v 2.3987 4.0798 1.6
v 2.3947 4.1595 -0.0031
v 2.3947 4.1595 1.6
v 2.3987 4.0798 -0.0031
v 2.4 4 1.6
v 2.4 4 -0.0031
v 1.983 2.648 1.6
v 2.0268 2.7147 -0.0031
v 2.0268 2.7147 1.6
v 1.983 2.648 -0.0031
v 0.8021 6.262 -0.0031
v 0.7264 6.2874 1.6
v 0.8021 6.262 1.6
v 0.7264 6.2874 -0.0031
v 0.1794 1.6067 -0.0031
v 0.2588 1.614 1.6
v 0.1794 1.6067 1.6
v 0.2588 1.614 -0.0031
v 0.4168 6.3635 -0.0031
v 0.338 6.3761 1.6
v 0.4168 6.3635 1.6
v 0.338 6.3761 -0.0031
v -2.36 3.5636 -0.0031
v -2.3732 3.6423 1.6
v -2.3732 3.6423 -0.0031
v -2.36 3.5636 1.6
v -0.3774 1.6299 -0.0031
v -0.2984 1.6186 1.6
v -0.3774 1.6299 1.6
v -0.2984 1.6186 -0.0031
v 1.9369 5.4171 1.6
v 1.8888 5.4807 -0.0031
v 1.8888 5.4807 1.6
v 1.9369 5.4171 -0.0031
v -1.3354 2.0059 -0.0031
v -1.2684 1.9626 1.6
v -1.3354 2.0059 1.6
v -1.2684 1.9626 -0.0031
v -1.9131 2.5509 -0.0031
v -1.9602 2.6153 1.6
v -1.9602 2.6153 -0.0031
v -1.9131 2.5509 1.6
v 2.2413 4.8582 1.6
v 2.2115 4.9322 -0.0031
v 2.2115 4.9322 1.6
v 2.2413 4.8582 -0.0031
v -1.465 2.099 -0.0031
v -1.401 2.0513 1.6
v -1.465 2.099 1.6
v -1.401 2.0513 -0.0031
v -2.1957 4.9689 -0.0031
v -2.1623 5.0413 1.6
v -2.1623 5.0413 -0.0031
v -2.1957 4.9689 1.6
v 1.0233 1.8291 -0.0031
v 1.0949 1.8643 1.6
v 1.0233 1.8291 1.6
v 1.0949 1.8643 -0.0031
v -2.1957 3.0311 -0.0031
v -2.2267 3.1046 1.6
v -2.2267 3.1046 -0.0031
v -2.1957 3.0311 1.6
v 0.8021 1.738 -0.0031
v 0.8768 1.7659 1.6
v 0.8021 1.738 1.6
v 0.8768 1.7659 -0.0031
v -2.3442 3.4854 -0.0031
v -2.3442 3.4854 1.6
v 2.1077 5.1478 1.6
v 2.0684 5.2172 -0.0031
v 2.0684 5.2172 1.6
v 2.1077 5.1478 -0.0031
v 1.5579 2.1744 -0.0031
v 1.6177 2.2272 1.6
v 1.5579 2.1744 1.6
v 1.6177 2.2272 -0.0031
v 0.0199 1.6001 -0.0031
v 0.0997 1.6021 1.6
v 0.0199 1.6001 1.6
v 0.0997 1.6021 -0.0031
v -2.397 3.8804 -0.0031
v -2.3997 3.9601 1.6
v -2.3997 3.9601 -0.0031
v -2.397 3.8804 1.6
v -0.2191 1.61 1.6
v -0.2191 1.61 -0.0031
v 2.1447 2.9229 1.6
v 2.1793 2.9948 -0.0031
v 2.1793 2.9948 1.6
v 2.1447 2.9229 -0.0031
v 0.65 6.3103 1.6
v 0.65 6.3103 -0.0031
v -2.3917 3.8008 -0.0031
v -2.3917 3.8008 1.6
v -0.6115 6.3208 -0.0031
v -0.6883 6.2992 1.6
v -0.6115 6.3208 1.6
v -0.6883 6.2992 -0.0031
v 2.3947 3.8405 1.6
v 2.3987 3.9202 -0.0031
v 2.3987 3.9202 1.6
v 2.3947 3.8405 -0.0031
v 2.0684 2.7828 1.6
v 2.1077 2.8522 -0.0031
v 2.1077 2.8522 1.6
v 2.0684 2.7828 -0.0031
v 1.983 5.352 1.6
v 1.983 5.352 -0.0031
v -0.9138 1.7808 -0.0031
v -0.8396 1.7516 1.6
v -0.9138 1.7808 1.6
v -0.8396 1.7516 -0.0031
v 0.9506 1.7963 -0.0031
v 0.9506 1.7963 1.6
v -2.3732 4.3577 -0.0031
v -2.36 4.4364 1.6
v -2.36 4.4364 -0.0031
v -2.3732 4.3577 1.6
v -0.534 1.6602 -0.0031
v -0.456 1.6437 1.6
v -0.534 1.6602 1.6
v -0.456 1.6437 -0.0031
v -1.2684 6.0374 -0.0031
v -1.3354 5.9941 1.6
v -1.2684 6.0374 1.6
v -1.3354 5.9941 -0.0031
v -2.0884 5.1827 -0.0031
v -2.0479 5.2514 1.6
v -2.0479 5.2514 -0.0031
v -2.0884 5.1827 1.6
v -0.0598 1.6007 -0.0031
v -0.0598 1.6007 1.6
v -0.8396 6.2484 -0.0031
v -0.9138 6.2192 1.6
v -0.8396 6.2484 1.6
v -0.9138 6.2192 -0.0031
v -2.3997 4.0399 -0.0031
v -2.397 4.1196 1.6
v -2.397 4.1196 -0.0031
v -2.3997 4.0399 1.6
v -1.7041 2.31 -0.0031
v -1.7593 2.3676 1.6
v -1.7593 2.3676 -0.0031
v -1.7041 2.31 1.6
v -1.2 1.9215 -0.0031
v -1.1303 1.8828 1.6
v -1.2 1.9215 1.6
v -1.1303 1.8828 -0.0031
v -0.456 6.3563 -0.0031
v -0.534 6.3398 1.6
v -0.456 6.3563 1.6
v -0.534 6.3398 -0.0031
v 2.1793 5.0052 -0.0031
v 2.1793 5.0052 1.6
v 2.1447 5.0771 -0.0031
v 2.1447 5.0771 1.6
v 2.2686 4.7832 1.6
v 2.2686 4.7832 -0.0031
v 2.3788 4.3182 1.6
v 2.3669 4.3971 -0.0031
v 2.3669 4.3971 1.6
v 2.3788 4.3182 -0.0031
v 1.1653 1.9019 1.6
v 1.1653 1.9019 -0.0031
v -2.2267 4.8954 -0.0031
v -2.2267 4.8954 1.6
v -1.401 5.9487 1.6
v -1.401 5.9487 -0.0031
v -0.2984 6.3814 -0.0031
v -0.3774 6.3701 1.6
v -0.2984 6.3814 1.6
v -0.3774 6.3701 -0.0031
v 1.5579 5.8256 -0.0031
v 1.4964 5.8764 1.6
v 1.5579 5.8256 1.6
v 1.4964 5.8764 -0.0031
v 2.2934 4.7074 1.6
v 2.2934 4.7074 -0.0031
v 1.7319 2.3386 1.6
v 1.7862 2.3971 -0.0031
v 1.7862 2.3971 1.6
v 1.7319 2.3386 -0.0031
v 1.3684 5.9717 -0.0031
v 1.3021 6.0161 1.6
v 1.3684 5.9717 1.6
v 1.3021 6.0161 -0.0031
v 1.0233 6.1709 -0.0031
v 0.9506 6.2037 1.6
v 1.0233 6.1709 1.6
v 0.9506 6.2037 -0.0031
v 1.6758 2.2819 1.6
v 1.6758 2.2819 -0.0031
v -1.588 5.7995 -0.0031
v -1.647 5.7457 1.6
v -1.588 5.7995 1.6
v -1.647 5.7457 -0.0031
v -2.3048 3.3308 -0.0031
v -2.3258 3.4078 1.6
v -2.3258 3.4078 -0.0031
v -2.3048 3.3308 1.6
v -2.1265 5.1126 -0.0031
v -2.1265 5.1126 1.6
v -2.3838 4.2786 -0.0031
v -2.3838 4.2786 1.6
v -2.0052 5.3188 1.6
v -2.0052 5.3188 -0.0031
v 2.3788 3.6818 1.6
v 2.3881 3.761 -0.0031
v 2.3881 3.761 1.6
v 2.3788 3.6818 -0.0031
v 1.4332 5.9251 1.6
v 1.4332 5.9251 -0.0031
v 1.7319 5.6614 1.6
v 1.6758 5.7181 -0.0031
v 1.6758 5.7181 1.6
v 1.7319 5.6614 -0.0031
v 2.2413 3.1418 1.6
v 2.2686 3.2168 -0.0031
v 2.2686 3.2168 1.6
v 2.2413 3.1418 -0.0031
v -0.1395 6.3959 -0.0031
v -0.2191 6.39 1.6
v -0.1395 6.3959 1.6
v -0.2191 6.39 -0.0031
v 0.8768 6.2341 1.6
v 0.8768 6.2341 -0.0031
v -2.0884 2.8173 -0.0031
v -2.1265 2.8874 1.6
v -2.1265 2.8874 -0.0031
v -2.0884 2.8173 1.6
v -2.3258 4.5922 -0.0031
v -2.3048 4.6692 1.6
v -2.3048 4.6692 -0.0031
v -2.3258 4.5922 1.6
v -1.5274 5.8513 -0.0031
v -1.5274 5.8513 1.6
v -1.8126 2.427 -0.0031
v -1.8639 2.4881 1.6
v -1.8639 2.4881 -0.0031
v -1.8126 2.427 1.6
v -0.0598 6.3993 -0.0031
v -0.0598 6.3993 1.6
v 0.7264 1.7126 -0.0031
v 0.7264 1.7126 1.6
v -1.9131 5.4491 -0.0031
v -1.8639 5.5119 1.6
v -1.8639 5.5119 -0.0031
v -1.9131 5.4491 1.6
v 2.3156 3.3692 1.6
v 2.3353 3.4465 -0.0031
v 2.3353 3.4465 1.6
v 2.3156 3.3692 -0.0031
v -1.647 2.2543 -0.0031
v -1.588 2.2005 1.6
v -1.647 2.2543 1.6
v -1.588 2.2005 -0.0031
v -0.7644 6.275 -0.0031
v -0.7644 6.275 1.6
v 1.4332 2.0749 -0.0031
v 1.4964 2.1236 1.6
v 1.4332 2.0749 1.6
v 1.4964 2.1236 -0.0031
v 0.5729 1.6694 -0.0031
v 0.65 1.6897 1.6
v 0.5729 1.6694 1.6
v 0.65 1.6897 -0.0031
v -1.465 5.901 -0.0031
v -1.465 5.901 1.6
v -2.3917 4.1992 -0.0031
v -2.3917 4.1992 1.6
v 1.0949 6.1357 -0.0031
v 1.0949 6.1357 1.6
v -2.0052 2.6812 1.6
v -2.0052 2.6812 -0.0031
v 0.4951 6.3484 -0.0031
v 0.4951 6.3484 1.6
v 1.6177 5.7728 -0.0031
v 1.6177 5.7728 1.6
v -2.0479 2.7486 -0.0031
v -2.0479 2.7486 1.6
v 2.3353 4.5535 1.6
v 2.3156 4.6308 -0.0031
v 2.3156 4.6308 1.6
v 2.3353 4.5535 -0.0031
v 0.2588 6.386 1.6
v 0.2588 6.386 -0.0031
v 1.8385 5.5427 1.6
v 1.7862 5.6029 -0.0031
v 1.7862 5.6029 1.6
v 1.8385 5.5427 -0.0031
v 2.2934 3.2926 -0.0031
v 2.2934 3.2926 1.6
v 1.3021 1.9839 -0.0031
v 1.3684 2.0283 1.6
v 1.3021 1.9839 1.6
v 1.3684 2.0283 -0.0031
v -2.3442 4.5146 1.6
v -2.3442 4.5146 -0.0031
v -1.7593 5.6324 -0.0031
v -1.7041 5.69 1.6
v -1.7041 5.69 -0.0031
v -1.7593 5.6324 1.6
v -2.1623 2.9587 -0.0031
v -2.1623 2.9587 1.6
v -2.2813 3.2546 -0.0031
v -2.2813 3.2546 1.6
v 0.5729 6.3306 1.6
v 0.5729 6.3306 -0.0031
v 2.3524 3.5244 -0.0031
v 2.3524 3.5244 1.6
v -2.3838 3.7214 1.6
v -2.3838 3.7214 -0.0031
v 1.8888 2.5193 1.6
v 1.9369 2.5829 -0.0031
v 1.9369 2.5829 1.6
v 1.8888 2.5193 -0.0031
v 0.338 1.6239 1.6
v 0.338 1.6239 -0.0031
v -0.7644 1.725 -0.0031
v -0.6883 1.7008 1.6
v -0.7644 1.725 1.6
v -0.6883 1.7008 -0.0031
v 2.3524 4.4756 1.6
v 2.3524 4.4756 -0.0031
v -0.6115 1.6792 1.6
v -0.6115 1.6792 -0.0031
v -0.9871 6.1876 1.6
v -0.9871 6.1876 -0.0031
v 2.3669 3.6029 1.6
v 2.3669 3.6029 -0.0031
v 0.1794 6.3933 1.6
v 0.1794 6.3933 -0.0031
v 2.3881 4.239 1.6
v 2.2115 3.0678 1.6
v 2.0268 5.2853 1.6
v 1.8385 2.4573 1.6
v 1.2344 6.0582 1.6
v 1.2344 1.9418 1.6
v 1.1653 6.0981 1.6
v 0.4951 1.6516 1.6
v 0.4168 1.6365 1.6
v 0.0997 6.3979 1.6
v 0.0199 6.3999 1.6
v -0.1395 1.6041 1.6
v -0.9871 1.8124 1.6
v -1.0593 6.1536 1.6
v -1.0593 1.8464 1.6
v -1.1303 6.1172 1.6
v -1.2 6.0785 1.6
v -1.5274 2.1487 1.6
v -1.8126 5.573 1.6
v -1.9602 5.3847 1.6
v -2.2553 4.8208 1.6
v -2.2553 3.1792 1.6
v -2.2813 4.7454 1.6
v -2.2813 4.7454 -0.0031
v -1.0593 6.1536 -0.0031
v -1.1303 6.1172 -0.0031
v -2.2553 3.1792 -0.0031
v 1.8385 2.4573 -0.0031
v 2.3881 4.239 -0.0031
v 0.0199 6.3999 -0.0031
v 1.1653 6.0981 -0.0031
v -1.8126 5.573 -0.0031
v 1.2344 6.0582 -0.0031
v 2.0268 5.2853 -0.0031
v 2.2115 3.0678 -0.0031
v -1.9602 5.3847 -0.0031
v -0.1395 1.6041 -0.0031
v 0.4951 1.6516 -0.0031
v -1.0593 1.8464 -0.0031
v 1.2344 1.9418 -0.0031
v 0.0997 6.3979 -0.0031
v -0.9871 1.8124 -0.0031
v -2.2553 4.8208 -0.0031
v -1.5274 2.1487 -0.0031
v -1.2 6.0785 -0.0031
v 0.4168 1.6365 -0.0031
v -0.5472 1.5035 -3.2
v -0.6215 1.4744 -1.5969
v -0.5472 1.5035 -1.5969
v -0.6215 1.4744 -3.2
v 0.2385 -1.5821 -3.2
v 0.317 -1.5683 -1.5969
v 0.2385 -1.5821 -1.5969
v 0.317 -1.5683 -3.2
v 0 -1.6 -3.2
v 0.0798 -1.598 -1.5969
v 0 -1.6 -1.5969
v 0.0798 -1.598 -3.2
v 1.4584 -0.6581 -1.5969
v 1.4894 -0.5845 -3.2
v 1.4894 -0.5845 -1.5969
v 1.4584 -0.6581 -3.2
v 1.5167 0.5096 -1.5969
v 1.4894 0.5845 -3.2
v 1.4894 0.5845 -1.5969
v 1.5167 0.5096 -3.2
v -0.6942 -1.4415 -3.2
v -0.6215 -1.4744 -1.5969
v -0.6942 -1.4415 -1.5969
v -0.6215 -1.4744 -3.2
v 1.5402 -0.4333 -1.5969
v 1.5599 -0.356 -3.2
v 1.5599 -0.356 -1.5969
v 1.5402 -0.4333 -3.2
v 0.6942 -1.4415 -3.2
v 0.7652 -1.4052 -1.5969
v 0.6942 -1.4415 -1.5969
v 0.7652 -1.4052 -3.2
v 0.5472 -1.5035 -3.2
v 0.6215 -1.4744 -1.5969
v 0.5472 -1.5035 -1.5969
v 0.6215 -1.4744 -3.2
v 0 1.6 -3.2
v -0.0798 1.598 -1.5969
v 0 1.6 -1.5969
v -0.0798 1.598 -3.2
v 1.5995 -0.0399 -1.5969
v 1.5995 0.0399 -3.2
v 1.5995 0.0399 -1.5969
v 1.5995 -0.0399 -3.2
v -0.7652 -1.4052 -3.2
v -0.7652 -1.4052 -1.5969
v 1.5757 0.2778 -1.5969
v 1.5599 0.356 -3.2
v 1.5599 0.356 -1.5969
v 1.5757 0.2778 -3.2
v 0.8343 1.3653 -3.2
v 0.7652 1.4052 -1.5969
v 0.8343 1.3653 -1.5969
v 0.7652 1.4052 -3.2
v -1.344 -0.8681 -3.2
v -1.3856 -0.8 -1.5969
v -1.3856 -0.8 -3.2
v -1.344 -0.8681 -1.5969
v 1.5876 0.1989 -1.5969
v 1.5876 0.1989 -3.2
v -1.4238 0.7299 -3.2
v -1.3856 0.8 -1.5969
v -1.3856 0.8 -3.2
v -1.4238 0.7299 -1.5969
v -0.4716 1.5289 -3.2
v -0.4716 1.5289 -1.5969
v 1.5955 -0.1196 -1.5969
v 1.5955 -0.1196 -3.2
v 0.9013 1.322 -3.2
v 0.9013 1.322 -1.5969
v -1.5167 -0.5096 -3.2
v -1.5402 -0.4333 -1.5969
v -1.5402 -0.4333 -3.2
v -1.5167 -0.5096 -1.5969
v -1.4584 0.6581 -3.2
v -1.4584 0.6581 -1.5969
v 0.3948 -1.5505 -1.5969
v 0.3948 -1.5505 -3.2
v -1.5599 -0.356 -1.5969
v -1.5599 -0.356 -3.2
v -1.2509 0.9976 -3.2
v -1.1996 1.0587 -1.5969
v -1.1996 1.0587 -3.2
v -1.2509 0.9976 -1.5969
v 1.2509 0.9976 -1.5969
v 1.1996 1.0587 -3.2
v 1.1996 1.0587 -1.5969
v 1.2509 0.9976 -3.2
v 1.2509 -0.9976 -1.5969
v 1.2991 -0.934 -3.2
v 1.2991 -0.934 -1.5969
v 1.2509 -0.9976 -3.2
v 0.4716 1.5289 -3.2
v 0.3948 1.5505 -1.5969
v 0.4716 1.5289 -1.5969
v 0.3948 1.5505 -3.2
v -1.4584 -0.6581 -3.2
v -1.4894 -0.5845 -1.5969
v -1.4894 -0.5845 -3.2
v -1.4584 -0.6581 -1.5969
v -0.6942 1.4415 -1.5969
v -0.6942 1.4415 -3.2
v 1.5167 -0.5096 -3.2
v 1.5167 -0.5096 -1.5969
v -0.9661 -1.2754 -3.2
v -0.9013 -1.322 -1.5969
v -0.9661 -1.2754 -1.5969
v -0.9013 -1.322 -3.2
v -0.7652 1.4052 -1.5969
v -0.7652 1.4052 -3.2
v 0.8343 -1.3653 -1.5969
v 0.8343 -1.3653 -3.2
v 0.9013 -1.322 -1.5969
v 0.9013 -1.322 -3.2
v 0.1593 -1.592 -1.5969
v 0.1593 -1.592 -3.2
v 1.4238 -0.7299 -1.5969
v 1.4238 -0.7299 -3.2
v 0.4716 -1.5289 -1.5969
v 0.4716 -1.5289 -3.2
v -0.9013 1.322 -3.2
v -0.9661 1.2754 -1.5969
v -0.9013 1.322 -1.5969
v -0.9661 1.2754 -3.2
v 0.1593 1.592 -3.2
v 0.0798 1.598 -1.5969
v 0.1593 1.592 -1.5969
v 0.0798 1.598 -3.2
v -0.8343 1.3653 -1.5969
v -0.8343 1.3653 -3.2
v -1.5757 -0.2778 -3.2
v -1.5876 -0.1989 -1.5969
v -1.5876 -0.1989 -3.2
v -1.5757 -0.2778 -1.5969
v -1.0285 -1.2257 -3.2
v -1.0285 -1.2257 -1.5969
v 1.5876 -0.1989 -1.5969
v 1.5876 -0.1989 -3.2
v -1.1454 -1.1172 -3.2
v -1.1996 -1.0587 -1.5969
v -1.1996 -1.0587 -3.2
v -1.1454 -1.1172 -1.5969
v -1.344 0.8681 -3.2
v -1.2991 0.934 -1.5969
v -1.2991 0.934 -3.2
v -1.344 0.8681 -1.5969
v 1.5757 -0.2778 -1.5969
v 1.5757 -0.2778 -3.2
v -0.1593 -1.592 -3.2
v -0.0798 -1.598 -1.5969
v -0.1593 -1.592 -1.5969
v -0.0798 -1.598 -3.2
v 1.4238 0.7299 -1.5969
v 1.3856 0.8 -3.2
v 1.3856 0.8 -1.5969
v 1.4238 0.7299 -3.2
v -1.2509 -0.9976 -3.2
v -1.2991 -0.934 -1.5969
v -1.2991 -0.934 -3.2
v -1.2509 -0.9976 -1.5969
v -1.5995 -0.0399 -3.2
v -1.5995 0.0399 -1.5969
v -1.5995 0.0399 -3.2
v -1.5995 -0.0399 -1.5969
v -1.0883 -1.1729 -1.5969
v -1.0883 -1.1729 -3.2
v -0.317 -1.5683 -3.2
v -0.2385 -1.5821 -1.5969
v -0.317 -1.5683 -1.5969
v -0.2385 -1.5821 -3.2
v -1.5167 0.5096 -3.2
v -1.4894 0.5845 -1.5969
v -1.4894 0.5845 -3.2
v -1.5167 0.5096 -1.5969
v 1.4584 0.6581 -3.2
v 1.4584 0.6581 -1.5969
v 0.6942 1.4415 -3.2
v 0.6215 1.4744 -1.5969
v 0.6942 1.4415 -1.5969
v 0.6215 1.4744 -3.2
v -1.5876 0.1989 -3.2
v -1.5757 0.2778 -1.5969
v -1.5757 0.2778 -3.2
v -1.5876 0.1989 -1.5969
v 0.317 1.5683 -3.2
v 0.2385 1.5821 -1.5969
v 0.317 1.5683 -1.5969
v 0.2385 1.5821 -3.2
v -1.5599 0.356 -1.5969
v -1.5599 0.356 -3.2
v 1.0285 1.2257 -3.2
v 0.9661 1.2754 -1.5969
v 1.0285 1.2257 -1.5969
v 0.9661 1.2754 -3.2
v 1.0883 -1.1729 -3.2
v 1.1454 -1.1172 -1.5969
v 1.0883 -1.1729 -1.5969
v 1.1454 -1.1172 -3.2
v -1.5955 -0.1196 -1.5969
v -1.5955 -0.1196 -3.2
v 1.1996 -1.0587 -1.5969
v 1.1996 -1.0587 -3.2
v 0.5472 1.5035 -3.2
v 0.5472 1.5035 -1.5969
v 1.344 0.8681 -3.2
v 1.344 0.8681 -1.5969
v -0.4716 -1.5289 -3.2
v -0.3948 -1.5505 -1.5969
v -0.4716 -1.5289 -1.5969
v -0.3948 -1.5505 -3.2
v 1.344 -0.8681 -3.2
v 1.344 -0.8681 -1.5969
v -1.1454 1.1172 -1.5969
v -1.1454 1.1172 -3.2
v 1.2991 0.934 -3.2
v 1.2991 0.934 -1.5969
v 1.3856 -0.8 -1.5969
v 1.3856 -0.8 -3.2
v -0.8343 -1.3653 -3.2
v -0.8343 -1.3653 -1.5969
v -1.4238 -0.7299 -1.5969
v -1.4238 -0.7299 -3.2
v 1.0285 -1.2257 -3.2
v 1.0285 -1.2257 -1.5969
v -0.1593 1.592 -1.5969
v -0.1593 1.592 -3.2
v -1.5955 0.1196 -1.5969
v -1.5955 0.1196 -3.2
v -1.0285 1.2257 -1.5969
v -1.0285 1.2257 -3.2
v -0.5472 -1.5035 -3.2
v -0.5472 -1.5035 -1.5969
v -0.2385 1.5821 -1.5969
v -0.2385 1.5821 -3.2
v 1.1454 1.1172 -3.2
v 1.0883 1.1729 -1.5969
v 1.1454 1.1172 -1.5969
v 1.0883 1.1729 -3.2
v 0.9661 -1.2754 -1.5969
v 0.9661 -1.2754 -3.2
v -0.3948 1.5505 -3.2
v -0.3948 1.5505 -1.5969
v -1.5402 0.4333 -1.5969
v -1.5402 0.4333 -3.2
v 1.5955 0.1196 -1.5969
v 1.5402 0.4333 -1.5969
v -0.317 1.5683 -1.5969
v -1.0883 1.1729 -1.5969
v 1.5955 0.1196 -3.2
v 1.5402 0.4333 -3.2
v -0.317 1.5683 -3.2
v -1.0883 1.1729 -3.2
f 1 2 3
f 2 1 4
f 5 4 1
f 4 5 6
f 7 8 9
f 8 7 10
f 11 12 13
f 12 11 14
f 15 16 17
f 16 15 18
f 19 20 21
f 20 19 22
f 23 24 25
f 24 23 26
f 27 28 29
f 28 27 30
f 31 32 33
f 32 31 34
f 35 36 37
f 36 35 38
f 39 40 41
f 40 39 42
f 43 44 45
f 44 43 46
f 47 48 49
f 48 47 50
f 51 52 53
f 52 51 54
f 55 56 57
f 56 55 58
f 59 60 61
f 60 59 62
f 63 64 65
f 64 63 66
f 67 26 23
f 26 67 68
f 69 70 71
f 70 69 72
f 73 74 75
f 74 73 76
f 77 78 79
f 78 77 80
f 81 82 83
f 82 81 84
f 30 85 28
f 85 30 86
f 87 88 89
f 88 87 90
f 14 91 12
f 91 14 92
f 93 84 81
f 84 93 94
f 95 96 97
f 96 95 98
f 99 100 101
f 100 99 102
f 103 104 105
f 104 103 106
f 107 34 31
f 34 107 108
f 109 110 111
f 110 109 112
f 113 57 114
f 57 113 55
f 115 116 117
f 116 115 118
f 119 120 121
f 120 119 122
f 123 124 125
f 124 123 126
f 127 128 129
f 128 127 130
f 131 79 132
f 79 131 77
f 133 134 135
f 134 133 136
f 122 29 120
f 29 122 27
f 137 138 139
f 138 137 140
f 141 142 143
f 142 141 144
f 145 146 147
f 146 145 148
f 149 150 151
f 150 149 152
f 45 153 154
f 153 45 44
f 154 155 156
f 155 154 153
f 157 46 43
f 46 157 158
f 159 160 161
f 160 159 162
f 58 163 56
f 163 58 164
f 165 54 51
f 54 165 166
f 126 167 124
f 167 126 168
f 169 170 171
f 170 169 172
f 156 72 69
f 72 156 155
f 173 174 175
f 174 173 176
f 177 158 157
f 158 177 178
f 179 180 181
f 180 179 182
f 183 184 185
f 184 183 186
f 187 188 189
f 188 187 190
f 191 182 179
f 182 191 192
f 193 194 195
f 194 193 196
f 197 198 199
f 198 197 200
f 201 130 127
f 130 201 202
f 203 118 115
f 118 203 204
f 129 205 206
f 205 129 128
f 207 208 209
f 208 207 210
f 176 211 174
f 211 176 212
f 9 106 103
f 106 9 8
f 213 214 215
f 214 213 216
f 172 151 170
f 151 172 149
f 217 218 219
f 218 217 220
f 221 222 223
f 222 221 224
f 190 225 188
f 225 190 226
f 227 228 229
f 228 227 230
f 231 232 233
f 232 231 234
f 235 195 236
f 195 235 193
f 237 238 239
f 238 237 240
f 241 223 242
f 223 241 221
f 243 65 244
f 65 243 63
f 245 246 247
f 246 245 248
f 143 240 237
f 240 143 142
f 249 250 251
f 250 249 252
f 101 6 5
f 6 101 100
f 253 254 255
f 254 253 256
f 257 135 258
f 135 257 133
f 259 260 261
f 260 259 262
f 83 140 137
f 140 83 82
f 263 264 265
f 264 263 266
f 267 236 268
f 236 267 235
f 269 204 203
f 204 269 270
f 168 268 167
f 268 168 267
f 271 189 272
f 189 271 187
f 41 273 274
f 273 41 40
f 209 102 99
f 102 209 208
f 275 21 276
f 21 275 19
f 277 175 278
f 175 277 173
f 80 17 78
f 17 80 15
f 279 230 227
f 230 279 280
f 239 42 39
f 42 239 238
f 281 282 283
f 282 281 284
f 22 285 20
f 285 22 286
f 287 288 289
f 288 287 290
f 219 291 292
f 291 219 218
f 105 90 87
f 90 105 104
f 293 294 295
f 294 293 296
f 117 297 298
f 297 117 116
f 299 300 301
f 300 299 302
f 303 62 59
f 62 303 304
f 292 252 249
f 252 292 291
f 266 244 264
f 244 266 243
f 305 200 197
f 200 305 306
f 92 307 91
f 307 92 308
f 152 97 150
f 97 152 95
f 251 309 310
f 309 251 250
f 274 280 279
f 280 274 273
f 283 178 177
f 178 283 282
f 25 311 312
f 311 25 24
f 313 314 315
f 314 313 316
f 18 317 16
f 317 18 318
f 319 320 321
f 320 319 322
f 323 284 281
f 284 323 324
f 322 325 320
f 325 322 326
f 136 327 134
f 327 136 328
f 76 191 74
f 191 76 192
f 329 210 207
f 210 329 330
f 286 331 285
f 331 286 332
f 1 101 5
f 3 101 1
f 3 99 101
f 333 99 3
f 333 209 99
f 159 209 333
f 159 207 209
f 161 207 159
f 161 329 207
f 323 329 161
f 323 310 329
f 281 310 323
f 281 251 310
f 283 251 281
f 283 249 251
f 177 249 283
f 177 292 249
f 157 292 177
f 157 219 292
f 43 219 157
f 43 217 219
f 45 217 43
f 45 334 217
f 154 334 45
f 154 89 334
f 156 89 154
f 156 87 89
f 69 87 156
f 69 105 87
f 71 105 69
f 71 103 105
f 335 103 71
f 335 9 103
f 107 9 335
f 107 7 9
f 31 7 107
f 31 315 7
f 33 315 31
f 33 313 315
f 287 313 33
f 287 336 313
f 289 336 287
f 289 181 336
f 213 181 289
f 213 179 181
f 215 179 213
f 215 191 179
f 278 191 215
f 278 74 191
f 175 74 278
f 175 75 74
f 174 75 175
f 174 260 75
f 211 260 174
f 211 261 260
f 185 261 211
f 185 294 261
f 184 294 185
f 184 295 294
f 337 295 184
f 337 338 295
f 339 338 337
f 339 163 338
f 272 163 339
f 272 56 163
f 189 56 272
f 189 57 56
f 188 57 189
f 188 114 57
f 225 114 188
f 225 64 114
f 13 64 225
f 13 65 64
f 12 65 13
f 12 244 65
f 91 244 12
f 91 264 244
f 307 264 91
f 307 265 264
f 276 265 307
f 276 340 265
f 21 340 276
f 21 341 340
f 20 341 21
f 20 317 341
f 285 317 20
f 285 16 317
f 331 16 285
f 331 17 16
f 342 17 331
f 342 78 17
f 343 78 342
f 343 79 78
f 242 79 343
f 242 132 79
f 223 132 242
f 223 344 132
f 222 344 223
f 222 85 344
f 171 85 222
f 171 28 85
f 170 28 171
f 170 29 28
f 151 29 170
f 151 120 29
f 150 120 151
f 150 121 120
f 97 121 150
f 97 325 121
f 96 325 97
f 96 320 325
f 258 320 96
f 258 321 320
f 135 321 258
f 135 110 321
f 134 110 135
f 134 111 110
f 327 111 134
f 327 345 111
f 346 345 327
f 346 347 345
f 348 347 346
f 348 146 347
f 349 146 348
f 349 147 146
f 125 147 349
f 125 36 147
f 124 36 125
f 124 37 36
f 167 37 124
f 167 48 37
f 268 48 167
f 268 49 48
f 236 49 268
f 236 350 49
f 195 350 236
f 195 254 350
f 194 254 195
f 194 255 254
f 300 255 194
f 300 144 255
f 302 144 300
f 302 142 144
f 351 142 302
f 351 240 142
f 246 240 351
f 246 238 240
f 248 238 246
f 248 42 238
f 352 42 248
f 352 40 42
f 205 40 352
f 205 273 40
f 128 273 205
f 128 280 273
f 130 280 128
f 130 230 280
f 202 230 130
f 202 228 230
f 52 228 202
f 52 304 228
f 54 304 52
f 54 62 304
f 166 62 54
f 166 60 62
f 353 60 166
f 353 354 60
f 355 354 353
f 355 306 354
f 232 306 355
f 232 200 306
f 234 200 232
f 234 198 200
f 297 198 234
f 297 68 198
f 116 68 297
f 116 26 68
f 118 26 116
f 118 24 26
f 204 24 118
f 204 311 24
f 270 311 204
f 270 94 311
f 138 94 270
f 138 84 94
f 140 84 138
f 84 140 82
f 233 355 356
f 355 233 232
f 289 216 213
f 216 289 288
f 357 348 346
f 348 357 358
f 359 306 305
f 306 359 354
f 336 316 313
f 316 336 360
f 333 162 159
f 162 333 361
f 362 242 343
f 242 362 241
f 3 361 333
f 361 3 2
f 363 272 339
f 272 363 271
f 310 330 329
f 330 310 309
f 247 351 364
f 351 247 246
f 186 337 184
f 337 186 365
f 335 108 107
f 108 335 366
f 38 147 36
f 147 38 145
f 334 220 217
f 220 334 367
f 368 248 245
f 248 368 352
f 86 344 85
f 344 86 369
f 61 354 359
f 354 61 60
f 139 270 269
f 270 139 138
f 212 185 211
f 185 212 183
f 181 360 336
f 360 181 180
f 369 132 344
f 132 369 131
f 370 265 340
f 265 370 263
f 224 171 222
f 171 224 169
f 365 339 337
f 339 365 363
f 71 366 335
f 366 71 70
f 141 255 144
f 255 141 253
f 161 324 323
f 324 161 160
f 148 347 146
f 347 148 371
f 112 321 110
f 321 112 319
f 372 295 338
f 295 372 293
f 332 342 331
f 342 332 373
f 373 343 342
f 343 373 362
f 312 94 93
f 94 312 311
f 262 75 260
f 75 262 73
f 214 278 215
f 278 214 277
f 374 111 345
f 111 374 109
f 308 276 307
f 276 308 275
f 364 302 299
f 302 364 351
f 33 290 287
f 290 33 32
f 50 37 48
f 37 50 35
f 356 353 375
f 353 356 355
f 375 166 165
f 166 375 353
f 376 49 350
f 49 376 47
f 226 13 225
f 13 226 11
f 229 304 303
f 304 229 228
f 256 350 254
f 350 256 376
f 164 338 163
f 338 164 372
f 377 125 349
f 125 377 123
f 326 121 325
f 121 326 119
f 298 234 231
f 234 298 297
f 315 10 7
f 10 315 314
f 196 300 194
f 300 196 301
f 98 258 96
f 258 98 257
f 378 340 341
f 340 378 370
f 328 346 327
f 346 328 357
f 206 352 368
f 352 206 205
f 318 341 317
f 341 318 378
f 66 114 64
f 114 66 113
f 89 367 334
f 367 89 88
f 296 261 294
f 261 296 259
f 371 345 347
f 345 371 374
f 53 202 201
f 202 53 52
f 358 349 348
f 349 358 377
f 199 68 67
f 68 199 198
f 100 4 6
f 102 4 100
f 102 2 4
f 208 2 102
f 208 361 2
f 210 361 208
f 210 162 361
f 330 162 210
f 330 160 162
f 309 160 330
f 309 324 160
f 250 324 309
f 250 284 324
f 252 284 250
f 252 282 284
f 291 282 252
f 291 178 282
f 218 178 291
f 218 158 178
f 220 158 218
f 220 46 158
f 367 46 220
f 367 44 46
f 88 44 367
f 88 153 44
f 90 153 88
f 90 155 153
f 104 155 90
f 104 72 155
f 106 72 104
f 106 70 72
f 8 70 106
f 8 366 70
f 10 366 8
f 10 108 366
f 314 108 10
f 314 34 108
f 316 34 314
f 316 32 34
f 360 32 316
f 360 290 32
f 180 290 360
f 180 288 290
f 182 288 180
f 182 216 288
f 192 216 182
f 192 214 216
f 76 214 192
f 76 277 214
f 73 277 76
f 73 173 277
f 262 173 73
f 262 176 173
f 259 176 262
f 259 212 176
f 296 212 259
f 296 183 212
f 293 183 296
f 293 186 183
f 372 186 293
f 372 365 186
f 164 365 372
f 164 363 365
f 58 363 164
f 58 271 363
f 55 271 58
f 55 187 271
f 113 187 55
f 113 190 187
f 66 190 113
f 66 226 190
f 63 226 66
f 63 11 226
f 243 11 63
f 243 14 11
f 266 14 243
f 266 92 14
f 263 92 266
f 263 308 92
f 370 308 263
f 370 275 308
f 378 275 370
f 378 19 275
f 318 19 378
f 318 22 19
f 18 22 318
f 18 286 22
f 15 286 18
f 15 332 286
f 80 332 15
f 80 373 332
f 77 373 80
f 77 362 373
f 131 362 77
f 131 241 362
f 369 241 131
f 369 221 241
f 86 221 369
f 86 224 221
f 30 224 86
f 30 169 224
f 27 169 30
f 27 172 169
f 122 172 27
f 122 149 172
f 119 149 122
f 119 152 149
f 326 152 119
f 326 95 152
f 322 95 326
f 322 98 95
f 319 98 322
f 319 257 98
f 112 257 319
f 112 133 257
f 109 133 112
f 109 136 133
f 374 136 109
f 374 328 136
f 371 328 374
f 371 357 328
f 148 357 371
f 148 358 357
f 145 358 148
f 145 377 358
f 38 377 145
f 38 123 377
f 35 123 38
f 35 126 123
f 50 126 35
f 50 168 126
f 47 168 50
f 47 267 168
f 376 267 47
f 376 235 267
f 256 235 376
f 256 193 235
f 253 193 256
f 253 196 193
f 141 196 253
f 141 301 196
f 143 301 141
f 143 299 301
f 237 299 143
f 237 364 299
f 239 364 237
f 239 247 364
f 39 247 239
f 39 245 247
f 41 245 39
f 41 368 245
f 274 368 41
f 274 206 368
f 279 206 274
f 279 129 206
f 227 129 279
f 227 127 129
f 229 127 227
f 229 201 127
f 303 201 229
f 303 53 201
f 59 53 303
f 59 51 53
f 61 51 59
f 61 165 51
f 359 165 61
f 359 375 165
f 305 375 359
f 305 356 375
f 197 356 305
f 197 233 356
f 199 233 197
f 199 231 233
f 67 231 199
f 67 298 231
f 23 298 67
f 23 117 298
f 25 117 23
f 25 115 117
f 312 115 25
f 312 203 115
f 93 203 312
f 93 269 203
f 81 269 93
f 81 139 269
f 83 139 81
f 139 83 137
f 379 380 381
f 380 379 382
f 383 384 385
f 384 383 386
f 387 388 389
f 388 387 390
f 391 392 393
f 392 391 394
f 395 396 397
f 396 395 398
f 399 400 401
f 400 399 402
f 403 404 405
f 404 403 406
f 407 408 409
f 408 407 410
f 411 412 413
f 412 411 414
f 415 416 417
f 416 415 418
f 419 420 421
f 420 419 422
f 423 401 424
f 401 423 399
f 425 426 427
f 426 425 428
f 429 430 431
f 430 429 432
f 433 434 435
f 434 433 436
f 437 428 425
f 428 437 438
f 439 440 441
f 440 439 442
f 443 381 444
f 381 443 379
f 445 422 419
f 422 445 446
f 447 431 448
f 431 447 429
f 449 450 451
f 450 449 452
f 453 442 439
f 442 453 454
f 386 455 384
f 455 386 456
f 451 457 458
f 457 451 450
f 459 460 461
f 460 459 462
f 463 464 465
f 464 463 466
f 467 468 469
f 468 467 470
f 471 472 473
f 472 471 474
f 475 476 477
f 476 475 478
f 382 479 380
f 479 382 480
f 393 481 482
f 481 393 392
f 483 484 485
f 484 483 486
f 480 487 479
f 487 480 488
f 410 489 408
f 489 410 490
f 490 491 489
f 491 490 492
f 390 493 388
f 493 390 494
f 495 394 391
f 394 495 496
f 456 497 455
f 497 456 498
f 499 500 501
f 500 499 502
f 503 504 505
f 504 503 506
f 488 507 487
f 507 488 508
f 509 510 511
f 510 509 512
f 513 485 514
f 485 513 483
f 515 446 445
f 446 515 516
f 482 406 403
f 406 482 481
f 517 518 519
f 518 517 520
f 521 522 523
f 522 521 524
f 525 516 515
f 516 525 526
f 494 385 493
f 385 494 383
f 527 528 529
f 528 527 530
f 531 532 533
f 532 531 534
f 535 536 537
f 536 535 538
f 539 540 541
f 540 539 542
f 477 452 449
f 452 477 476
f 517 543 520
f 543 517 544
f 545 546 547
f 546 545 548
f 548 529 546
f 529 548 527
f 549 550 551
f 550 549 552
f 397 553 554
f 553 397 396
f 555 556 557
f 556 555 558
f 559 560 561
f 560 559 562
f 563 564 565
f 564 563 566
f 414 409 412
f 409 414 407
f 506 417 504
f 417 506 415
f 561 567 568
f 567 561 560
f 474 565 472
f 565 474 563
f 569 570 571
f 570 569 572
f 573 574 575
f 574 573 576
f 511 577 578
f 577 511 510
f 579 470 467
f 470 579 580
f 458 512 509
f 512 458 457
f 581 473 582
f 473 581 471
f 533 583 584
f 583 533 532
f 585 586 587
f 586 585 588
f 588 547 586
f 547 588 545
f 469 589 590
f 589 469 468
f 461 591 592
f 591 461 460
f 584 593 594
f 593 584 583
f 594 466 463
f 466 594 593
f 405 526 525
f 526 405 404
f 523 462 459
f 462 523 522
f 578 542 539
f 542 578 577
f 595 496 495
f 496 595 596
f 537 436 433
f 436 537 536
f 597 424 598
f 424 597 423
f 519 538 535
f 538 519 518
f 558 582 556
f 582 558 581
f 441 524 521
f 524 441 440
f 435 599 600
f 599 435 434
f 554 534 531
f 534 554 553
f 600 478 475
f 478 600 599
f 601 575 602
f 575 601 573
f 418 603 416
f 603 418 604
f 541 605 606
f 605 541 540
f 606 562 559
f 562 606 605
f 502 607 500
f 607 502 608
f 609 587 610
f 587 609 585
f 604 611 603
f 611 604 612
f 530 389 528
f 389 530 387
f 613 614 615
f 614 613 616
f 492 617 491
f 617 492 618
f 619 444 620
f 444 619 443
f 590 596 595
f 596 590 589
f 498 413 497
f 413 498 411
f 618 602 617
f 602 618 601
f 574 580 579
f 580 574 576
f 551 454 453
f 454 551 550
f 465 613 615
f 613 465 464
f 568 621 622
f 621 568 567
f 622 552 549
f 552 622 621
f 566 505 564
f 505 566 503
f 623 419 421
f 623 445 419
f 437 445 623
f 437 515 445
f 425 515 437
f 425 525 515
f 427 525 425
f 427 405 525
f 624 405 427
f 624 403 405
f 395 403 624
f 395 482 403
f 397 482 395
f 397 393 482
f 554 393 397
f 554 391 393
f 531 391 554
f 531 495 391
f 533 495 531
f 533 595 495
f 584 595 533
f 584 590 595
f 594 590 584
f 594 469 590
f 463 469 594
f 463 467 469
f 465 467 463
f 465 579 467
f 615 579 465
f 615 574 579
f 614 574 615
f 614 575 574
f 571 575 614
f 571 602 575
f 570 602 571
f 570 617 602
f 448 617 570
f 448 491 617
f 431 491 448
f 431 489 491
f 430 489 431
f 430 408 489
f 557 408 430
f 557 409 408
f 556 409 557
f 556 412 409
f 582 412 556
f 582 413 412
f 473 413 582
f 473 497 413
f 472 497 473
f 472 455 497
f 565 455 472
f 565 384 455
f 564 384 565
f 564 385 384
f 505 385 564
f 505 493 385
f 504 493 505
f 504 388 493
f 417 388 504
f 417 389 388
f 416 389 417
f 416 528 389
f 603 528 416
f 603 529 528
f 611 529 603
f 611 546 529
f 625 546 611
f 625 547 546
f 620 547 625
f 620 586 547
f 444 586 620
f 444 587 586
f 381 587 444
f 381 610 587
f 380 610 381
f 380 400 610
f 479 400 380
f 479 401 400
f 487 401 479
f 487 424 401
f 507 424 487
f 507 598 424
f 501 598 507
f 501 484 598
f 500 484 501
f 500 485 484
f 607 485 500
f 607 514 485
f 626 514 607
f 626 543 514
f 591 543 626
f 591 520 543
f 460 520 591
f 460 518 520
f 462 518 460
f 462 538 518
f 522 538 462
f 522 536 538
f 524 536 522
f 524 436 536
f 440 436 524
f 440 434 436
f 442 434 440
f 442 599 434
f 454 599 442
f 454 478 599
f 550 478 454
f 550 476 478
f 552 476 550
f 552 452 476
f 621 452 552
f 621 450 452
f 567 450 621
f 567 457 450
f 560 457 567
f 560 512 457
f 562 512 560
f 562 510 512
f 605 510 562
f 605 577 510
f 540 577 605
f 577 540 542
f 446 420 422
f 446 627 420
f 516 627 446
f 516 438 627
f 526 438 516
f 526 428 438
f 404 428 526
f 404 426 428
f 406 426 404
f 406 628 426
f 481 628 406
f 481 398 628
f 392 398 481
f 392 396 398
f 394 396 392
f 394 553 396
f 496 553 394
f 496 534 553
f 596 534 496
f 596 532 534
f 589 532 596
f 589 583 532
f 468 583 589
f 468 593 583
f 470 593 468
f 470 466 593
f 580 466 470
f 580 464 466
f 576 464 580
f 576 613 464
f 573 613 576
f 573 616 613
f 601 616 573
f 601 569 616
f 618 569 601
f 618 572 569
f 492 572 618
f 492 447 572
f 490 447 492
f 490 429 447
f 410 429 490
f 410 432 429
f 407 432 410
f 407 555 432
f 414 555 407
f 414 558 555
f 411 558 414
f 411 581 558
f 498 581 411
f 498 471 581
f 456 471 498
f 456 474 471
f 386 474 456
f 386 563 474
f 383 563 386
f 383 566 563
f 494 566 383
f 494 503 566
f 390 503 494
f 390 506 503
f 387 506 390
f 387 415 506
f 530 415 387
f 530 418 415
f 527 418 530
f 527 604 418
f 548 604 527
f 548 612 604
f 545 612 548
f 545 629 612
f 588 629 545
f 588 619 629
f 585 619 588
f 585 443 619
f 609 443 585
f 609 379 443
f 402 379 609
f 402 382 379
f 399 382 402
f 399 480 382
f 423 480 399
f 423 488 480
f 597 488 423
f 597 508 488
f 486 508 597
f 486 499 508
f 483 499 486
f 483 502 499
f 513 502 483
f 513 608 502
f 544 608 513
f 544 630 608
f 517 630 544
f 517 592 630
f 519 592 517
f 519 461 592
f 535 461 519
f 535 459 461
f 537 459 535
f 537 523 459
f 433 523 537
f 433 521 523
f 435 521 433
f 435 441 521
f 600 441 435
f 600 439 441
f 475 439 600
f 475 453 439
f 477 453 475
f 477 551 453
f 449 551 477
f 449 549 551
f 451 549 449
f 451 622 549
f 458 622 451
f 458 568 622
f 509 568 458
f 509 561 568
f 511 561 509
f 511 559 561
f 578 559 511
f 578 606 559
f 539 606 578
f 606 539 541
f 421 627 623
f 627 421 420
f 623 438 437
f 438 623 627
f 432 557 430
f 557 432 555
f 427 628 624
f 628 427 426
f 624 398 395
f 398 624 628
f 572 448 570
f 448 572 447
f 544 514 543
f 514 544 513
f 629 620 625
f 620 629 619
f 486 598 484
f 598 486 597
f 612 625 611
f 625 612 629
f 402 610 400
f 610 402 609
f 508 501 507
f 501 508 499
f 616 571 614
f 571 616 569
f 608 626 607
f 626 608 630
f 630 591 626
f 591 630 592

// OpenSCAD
use <../lib.scad>
use <15672.scad>
use <6142275j.scad>
$fa=1; $fs=0.2;
function ldraw_lib__15672dy1(realsolid=false) = [
// 0 Slope Plate 45  2 x  1 with Red Line on Black, Grey and White Background Left Sticker
// 0 Name: 15672dy1.dat
// 0 Author: Massimo Maso [Sirio]
// 0 !LDRAW_ORG Shortcut UPDATE 2022-06
// 0 !LICENSE Licensed under CC BY 2.0 and CC BY 4.0 : see CAreadme.txt
// 
// 0 BFC CERTIFY CCW
  [0,"BFC","CERTIFY"],
  [0,"BFC","CCW"],
// 
// 0 !KEYWORDS Audi, e-tron, quattro, R18, Set 75872, Speed Champions
// 
// 0 !HISTORY 2022-12-20 [PTadmin] Official Update 2022-06
// 
// 
// 1 16 0 0 0 1 0 0 0 1 0 0 0 1 15672.dat
  [1,16,0,0,0,1,0,0,0,1,0,0,0,1, ldraw_lib__15672(realsolid)],
// 1 16 0 -6 -10 1 0 0 0 .707107 -.707107 0 .707107 .707107 6142275j.dat
  [1,16,0,-6,-10,1,0,0,0,.707107,-.707107,0,.707107,.707107, ldraw_lib__6142275j(realsolid)],
];
module ldraw_lib__15672dy1(step=0, col=false, unit=2/5, alt=false, line=0.2, solid=!$preview)
    makepoly(ldraw_lib__15672dy1(solid), step=step, col=col, unit=unit, alt=alt, line=line, solid=solid);
ldraw_lib__15672dy1(line=0.2);
